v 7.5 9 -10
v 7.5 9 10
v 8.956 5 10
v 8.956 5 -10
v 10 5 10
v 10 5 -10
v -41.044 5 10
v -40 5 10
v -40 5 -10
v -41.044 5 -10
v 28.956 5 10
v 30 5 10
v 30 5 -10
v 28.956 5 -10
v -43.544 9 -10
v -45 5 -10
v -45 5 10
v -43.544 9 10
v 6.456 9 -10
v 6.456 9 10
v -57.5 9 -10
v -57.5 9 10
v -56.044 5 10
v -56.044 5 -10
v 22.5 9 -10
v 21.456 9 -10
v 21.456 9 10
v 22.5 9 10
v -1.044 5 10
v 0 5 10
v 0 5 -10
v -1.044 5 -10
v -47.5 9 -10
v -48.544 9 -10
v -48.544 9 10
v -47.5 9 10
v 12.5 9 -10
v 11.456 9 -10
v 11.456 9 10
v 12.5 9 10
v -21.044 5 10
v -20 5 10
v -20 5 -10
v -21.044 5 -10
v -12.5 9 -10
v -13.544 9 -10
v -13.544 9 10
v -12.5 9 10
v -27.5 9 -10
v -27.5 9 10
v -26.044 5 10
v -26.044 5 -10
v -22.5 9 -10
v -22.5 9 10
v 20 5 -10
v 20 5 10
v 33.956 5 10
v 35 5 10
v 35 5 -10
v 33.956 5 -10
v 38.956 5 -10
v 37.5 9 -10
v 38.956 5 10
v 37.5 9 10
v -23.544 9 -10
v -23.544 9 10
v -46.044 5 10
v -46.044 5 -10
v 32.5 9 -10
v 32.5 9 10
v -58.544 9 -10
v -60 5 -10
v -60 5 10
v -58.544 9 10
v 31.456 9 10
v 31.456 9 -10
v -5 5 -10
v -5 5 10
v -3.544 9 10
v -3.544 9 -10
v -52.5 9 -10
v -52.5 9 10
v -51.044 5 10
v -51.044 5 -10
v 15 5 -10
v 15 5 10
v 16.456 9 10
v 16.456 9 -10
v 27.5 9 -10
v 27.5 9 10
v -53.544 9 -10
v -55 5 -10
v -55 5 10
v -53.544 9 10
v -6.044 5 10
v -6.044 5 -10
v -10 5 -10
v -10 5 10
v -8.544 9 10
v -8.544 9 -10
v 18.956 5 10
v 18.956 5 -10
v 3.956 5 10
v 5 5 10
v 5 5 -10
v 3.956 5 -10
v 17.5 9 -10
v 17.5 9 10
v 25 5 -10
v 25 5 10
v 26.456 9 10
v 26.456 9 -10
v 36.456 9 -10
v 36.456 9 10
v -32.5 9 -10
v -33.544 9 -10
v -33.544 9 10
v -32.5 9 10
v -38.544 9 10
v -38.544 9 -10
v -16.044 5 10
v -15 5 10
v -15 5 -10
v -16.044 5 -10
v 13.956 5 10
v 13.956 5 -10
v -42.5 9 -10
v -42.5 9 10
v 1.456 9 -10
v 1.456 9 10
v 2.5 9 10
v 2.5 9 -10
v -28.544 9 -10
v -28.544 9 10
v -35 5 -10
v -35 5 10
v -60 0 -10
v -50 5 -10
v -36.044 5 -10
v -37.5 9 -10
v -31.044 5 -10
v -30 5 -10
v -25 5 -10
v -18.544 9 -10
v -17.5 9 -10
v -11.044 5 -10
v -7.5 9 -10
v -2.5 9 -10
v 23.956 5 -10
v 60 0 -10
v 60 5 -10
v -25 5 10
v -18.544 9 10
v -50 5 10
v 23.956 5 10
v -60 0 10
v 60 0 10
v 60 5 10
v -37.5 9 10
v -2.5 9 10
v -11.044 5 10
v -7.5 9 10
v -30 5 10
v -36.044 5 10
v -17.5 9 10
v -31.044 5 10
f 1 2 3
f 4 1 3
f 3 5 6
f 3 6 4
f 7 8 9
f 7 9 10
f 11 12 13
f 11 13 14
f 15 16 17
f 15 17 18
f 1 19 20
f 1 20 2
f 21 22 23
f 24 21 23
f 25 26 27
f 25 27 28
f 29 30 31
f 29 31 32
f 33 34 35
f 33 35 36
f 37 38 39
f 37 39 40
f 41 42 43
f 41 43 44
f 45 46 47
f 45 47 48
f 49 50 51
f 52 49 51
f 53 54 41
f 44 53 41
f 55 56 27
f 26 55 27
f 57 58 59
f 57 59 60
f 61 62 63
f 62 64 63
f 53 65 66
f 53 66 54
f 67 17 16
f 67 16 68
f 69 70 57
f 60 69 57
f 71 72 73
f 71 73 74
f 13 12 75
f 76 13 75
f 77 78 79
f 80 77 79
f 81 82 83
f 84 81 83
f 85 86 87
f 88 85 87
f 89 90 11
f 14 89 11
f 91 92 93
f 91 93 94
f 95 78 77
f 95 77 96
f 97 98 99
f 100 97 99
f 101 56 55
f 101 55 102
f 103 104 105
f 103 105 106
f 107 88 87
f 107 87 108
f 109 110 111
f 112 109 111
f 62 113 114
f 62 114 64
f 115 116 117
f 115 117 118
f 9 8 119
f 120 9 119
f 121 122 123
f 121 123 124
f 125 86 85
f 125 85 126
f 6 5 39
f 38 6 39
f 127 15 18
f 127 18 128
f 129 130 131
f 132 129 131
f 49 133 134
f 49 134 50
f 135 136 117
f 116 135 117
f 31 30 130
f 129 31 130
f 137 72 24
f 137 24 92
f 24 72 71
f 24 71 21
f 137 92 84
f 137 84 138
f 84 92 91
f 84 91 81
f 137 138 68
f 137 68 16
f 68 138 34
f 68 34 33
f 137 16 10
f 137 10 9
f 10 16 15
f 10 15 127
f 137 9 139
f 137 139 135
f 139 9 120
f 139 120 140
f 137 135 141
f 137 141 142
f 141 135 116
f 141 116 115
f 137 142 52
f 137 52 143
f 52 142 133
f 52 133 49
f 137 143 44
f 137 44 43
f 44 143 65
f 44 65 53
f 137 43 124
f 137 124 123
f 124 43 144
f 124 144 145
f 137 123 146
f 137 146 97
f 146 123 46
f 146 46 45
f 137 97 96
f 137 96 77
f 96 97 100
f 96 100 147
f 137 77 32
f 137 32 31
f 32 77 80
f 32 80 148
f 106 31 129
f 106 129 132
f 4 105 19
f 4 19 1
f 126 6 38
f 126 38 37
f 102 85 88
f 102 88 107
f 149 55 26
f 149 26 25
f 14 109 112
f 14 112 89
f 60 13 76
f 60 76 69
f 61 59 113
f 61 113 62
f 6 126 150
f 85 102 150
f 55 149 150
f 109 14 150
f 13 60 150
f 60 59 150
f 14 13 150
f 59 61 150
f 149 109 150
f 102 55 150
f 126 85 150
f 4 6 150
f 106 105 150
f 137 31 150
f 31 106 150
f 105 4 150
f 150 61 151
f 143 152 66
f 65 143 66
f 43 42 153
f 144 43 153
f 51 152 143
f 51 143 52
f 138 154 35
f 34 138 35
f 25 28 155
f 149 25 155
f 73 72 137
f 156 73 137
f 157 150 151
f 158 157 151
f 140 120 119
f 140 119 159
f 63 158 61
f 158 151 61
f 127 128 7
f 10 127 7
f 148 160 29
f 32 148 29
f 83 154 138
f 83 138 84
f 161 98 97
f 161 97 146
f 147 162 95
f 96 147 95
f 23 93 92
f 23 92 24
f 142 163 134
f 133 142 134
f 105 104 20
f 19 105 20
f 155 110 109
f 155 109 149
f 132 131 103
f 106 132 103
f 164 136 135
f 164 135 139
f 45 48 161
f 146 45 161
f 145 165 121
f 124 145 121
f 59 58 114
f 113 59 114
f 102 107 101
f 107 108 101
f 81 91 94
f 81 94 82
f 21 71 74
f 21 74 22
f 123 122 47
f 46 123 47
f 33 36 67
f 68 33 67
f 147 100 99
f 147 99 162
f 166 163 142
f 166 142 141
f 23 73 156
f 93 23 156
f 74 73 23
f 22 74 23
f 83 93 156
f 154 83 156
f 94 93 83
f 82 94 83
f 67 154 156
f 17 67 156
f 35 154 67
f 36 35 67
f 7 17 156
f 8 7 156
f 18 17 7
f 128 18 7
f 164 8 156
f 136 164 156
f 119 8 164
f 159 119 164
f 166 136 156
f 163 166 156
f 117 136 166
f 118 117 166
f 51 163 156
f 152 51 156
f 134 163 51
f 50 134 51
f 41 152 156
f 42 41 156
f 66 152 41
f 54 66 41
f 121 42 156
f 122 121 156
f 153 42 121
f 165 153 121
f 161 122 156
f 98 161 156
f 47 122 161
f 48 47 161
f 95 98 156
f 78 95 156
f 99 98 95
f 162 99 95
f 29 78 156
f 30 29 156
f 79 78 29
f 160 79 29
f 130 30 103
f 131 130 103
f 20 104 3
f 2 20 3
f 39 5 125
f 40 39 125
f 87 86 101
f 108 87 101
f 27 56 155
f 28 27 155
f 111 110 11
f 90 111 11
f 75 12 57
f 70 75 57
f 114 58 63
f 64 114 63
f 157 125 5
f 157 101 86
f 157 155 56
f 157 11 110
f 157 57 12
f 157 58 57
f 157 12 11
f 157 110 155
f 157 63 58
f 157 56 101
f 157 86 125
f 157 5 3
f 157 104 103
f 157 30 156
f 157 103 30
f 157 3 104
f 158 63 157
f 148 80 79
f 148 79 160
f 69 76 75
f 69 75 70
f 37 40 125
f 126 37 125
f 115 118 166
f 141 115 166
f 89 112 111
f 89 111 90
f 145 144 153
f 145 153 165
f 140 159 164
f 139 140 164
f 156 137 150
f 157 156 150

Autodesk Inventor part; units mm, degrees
ref_plane "YZ Plane" through (0, 0, 0) normal (1, 0, 0) x (0, 1, 0)
ref_plane "XZ Plane" through (0, 0, 0) normal (0, 1, 0) x (-1, 0, 0)
ref_plane "XY Plane" through (0, 0, 0) normal (0, 0, 1) x (1, 0, 0)
sketch "Эскиз1" plane through (0, 0, 0) normal (0, 0, 1) x (1, 0, 0)
  line L0 (-60, 0) -> (60, 0)
  line L1 (60, 0) -> (60, 5)
  line L2 (60, 5) -> (-60, 5)
  line L3 (-60, 5) -> (-60, 0)
  point P0 (0, 0)
  point P1 (0, 0)
  dimension "d0" = 5
  dimension "d1" = 120
extrude "Выдавливание1" add sketch "Эскиз1" along normal mid plane 20
sketch "Эскиз3" plane through (0, 0, 0) normal (0, 0, 1) x (1, 0, 0)
  line L0 (-60, 5) -> (-58.5441, 9)
  line L1 (-58.5441, 9) -> (-57.5, 9)
  line L2 (-57.5, 9) -> (-56.0441, 5)
  line L3 (-60, 5) -> (60, 5) projected
  line L4 (-59.2721, 7) -> (-56.7721, 7) construction
  point P0 (0, 0)
  dimension "d4" = 40
  dimension "d5" = 4
  dimension "d6" = 2.5
extrude "Выдавливание2" add sketch "Эскиз3" against normal up to surface (20 mm away) from surface at 10
pattern_linear "Прямоуг.массив1" count 20 spacing 5 along (1, 0, 0) of "Выдавливание2"
properties part number "rack"
